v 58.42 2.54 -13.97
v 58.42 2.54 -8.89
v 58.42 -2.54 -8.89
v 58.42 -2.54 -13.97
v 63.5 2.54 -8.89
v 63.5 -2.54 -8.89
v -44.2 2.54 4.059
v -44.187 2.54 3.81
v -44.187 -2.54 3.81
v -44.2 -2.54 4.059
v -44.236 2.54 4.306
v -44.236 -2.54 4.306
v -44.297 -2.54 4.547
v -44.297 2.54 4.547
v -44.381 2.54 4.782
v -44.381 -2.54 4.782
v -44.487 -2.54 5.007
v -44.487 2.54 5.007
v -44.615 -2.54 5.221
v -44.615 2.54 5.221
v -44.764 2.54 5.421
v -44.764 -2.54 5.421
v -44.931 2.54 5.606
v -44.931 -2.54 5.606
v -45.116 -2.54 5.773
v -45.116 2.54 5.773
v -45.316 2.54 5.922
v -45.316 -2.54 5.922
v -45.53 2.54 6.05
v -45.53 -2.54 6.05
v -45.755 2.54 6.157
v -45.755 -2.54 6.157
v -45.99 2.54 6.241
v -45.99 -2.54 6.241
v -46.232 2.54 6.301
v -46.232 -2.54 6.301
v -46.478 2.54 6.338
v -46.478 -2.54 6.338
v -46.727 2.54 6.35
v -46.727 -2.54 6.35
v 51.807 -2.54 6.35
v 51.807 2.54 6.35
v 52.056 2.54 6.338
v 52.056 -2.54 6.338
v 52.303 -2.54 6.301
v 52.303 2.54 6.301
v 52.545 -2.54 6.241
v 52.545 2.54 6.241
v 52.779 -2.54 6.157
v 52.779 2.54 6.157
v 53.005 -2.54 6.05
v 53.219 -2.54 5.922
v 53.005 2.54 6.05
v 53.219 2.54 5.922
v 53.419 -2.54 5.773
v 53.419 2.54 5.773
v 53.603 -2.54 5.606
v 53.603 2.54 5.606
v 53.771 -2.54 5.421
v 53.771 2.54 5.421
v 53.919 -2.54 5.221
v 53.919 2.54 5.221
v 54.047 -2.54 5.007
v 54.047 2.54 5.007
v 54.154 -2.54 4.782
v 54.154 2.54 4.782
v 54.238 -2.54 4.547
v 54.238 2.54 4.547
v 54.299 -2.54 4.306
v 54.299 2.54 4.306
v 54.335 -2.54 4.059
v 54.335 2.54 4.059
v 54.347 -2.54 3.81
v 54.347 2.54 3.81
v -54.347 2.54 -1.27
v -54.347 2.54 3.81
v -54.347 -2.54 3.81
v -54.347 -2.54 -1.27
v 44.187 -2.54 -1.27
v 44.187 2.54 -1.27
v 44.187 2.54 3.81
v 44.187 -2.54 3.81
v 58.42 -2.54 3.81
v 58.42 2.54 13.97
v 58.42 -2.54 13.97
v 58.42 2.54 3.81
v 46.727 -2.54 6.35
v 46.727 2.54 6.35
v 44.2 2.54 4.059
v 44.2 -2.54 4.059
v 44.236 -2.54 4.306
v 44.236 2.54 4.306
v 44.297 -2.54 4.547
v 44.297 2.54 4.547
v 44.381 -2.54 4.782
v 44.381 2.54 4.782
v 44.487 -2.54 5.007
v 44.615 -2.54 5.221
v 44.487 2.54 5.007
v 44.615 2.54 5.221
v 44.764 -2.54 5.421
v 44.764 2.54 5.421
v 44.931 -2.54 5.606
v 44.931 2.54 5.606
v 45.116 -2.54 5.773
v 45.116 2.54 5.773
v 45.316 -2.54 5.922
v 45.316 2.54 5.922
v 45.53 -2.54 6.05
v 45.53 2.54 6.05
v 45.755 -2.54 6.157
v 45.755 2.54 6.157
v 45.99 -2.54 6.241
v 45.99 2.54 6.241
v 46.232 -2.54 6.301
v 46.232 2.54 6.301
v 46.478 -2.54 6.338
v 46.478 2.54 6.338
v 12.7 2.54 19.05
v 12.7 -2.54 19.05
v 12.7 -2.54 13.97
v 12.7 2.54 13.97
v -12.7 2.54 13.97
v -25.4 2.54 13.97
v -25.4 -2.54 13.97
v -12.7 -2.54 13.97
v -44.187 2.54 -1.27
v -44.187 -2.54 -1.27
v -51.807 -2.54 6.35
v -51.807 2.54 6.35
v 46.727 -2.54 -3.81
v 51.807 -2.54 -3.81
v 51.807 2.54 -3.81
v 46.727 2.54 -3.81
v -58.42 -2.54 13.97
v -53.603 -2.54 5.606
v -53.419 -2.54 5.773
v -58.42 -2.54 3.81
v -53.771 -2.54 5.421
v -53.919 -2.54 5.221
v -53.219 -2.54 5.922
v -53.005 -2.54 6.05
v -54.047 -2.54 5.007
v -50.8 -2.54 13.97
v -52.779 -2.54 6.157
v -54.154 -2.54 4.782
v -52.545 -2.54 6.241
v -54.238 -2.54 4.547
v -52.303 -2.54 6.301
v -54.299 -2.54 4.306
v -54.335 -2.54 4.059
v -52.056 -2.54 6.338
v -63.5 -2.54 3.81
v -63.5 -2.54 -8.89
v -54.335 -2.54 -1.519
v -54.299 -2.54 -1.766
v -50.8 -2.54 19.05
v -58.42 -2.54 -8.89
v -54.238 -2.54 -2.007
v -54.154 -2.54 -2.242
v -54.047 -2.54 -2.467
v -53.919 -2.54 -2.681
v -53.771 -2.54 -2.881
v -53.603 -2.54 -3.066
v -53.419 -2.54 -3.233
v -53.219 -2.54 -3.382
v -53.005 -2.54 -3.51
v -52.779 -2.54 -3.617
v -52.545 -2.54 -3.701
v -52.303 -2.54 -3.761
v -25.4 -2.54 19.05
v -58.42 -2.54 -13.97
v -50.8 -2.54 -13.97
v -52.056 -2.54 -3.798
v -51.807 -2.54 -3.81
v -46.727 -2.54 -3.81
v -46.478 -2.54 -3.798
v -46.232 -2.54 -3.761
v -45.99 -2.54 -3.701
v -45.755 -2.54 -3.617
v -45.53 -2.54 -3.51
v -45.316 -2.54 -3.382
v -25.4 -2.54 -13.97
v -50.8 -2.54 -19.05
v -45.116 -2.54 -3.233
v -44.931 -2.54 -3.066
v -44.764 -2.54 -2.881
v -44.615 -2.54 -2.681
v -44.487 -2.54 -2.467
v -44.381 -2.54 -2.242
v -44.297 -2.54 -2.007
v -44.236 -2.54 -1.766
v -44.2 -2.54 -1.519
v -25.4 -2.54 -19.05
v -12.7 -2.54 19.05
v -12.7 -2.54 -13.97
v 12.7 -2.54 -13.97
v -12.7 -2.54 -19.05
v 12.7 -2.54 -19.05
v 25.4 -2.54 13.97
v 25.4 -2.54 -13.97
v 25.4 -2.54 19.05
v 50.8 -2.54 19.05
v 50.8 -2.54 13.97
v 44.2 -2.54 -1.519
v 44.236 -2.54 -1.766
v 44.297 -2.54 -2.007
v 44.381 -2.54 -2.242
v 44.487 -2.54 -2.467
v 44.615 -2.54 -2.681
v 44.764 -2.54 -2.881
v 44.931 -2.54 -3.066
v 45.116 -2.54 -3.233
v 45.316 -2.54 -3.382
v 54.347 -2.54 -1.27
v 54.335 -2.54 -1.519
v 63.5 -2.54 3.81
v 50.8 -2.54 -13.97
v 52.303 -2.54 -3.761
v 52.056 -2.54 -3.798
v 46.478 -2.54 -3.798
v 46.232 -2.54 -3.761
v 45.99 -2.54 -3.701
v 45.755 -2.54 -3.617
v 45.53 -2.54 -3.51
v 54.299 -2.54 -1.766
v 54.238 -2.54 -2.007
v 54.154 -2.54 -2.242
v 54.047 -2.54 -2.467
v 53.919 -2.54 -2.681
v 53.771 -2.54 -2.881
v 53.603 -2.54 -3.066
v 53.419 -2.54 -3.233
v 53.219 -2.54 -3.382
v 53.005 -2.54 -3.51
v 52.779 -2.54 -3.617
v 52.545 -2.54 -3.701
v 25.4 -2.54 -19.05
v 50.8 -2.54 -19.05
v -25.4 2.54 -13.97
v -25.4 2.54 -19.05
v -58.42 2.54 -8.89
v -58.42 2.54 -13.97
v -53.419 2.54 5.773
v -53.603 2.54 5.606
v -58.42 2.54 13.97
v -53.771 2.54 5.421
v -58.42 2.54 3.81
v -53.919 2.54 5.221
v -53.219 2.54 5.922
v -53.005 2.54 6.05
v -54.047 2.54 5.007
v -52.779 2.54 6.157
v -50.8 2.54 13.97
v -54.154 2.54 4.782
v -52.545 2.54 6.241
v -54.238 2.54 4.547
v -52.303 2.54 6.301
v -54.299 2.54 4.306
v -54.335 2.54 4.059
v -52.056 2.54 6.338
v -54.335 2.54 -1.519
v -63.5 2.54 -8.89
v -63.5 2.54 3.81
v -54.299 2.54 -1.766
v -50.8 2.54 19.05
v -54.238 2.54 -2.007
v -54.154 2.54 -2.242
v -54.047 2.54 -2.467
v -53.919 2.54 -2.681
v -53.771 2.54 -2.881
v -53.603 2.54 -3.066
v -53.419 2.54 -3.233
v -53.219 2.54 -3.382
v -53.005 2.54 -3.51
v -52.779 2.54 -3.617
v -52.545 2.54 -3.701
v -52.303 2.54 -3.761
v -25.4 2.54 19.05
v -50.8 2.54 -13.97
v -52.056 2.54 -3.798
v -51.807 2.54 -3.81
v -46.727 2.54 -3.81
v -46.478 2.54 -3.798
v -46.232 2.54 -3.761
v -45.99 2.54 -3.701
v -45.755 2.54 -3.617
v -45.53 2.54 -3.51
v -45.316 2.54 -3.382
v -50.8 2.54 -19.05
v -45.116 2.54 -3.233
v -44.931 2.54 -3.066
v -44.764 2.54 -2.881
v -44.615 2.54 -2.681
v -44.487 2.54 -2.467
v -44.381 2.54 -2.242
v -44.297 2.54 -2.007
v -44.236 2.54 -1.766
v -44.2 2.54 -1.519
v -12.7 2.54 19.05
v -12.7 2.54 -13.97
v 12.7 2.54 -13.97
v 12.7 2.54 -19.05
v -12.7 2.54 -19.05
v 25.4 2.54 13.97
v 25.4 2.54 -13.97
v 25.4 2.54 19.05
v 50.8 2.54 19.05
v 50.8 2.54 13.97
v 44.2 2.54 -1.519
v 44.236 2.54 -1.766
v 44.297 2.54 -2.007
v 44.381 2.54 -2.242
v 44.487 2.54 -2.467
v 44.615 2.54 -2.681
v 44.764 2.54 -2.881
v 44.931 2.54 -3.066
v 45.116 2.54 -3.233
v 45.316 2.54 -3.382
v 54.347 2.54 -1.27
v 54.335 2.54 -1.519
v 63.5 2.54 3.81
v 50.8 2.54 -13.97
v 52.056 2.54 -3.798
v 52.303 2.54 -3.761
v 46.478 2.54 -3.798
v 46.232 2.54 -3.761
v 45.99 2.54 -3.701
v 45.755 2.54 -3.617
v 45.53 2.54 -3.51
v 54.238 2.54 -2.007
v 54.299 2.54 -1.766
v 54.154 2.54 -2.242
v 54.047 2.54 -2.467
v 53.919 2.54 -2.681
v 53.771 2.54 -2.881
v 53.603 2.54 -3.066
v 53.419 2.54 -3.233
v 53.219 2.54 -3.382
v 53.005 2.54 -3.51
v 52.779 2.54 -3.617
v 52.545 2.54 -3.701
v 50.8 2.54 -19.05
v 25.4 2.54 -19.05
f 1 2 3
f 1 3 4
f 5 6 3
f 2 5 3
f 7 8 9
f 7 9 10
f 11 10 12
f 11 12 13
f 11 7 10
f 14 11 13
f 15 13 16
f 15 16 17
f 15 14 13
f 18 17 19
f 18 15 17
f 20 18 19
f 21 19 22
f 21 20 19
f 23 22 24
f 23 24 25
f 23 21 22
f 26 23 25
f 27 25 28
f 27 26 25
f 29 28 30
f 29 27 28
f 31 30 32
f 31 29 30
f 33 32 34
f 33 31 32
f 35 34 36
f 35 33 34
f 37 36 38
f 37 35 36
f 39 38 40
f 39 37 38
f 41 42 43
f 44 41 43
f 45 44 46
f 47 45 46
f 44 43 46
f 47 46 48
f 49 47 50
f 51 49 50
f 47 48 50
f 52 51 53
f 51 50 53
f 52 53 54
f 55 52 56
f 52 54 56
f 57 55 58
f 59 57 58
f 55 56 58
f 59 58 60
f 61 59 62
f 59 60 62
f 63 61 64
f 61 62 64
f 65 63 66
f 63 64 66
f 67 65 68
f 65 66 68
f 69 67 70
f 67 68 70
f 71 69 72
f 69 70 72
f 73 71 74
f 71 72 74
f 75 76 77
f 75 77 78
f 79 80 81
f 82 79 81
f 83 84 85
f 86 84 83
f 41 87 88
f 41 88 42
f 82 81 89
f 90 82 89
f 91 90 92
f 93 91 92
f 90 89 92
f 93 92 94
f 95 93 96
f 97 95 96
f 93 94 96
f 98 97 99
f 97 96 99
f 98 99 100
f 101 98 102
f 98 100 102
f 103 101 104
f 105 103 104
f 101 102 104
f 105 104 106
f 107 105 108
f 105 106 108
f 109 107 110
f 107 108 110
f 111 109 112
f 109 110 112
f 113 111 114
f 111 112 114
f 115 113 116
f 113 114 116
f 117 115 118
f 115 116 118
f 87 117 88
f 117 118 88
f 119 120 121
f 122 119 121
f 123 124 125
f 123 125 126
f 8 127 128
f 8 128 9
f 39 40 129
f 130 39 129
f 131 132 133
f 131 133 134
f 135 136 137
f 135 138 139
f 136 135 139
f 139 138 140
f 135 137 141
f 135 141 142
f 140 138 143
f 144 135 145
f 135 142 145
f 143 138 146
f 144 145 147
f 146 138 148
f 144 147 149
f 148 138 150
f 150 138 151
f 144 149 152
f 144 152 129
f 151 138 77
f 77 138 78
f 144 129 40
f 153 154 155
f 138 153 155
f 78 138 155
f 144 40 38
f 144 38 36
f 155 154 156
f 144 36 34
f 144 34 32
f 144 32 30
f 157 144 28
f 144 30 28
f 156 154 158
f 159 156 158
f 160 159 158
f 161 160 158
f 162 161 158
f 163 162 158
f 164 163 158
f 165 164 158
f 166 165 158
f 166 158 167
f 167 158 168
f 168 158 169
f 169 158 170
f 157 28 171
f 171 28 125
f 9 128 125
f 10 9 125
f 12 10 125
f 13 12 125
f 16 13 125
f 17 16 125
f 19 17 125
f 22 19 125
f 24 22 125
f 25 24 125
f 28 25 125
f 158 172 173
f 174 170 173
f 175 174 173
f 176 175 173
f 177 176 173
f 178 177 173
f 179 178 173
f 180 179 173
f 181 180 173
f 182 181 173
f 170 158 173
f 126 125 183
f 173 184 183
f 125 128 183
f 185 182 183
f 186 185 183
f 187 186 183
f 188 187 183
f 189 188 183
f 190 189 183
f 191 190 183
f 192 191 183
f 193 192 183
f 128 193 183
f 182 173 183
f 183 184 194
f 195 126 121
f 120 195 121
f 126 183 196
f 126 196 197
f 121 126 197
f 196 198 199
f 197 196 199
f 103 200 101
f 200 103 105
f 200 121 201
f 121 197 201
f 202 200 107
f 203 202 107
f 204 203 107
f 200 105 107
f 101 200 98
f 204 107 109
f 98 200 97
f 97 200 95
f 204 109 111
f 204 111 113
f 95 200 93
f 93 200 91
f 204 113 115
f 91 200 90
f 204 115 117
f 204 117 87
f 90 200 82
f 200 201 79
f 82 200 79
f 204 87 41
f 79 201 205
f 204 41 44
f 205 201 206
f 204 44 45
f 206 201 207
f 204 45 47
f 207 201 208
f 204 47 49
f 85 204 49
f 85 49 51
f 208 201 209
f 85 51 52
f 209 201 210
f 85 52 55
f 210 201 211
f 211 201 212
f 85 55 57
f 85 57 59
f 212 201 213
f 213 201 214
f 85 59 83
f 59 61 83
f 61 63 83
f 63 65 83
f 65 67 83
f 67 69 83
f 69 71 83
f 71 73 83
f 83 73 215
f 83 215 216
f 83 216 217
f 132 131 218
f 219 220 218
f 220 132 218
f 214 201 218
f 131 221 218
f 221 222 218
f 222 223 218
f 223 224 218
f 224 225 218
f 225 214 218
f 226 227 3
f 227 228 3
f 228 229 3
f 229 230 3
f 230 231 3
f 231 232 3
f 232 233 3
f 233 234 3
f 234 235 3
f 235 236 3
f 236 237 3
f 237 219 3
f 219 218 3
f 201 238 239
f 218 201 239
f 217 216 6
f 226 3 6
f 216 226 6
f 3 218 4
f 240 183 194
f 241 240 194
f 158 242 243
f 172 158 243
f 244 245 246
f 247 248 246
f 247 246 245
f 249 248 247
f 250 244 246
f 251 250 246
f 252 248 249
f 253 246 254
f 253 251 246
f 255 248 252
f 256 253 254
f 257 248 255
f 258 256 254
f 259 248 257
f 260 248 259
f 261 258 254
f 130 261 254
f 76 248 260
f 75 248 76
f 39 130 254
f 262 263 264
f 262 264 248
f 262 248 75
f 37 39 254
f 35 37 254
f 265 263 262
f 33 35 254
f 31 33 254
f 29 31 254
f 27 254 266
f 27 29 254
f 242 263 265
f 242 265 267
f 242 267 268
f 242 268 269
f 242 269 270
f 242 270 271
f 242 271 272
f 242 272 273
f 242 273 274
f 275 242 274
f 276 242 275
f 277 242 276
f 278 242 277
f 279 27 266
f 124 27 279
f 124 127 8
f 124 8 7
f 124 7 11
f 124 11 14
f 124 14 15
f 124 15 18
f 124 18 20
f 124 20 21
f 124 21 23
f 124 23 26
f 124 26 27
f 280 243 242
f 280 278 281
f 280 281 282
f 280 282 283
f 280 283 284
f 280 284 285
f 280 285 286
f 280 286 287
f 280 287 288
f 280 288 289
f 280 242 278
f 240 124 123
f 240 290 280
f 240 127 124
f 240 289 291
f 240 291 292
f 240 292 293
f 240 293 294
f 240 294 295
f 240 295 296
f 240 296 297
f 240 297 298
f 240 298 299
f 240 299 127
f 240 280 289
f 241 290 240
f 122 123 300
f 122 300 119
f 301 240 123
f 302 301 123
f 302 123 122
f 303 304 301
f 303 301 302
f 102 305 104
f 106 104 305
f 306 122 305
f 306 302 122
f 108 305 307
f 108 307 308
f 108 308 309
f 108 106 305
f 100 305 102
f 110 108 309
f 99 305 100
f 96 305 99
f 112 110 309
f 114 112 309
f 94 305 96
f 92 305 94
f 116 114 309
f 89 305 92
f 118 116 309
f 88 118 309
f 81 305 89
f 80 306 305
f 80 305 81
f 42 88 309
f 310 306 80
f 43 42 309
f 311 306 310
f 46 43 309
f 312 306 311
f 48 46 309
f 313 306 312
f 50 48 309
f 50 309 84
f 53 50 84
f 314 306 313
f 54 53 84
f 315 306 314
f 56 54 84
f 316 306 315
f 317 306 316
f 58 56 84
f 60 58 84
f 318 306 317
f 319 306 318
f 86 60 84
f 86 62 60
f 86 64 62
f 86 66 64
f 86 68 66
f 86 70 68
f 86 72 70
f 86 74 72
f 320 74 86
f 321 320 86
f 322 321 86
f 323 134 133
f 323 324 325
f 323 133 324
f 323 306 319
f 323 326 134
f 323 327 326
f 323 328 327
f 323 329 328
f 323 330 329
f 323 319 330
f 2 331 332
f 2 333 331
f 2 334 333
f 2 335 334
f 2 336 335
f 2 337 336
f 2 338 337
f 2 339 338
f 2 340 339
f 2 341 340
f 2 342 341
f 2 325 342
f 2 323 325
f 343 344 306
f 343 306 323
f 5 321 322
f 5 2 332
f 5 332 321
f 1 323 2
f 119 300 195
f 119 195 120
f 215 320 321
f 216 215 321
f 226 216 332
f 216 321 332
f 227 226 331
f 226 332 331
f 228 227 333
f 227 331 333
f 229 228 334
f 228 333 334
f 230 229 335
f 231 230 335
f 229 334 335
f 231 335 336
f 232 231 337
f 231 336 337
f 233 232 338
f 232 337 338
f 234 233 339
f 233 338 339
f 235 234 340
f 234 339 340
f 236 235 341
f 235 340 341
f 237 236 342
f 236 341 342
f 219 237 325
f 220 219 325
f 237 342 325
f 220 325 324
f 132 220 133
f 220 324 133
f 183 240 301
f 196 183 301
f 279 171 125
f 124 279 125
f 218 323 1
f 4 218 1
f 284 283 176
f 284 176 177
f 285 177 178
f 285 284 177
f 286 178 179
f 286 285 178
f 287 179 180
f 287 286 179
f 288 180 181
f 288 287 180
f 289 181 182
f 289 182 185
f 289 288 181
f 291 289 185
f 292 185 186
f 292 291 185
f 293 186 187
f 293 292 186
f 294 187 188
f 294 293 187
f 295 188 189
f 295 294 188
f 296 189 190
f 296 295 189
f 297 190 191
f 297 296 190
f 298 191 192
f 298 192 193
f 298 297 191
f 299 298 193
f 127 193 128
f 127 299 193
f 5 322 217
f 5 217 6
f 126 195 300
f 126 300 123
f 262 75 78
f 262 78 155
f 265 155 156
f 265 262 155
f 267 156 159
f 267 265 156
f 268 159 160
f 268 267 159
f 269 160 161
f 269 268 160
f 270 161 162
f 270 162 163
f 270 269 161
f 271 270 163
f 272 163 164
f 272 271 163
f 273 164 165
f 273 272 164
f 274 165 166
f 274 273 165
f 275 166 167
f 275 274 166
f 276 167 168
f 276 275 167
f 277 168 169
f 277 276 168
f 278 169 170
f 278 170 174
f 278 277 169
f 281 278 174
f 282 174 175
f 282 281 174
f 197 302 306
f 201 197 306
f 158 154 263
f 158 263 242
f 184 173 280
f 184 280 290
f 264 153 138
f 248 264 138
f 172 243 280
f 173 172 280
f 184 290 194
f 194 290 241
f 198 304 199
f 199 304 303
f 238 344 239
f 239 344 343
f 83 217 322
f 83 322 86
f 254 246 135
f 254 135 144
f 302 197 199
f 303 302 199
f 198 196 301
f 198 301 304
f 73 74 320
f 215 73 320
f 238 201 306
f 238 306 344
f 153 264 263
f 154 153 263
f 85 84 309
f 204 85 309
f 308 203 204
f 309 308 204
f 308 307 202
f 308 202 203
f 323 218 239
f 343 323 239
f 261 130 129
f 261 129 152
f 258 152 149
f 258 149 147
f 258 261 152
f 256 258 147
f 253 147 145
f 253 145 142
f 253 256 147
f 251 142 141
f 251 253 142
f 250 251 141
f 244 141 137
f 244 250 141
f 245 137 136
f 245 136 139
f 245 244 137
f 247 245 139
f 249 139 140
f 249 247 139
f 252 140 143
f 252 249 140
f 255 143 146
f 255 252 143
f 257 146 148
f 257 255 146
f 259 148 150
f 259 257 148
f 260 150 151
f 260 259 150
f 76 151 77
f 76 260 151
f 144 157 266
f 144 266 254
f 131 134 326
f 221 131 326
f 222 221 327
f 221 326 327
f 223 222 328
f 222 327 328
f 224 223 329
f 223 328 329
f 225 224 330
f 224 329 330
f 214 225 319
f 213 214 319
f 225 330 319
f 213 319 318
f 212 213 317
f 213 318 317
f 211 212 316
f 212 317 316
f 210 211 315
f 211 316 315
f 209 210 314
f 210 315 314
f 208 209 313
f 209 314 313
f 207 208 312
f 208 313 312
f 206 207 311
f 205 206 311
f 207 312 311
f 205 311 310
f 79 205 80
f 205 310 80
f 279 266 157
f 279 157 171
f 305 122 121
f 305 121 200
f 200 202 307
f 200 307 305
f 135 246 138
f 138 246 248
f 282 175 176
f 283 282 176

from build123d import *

# Parameters (mm, degrees)
SKETCH1_W           = 127
SKETCH1_H           = 38.1
BOSS_EXTRUDE1_DEPTH = 2.54
SKETCH2_W           = 5.08
SKETCH2_H           = 10.16
SKETCH2_H_2         = 15.24
CUT_EXTRUDE1_DEPTH  = 5.08
SKETCH3_W           = 12.7
SKETCH3_H           = 5.08
CUT_EXTRUDE2_DEPTH  = 5.08
SKETCH4_W           = 12.7
SKETCH4_H           = 5.08
CUT_EXTRUDE4_DEPTH  = 5.08
LPATTERN1_COUNT     = 2
LPATTERN1_PITCH     = 38.1
SKETCH7_W           = 116.84
SKETCH7_H           = 5.08
CUT_EXTRUDE7_DEPTH  = 5.08
SKETCH8_W           = 25.4
SKETCH8_H           = 5.08
BOSS_EXTRUDE2_DEPTH = 5.08
CUT_EXTRUDE8_DEPTH  = 5.08


with BuildPart() as part:
    # Sketch1 → Boss-Extrude1 (new body, symmetric)
    with BuildSketch(Plane(origin=(0, 0, 0), x_dir=(1, 0, 0), z_dir=(0, 1, 0))):
        Rectangle(SKETCH1_W, SKETCH1_H)
    extrude(amount=BOSS_EXTRUDE1_DEPTH, both=True)

    # Sketch2 → Cut-Extrude1 (cut)
    with BuildSketch(Plane(origin=(0, 2.54, 0), x_dir=(1, 0, 0), z_dir=(0, 1, 0))):
        with Locations((-60.96, 13.97)):
            Rectangle(SKETCH2_W, SKETCH2_H)
        with Locations((-60.96, -11.43)):
            Rectangle(SKETCH2_W, SKETCH2_H_2)
    cut_extrude1 = extrude(amount=-CUT_EXTRUDE1_DEPTH, mode=Mode.SUBTRACT)

    # Mirror1: Cut-Extrude1 across plane
    add(cut_extrude1.mirror(Plane(origin=(0, 0, 0), x_dir=(0, 0, 1), z_dir=(1, 0, 0))), mode=Mode.SUBTRACT)

    # Sketch3 → Cut-Extrude2 (cut)
    with BuildSketch(Plane(origin=(0, 2.54, 0), x_dir=(1, 0, 0), z_dir=(0, 1, 0))):
        with Locations((-57.15, -16.51)):
            Rectangle(SKETCH3_W, SKETCH3_H)
    cut_extrude2 = extrude(amount=-CUT_EXTRUDE2_DEPTH, mode=Mode.SUBTRACT)

    # Mirror2: Cut-Extrude2 across plane
    add(cut_extrude2.mirror(Plane(origin=(0, 0, 0), x_dir=(0, 0, 1), z_dir=(1, 0, 0))), mode=Mode.SUBTRACT)

    # Sketch4 → Cut-Extrude4 (cut)
    with BuildSketch(Plane(origin=(0, 2.54, 0), x_dir=(1, 0, 0), z_dir=(0, 1, 0))):
        with Locations((-19.05, -16.51)):
            Rectangle(SKETCH4_W, SKETCH4_H)
    cut_extrude4 = extrude(amount=-CUT_EXTRUDE4_DEPTH, mode=Mode.SUBTRACT)

    # LPattern1: Cut-Extrude4 ×2
    with Locations(*[(i * LPATTERN1_PITCH, 0, 0) for i in range(1, LPATTERN1_COUNT)]):
        add(cut_extrude4, mode=Mode.SUBTRACT)

    # Sketch7 → Cut-Extrude7 (cut)
    with BuildSketch(Plane(origin=(0, 2.54, 0), x_dir=(1, 0, 0), z_dir=(0, 1, 0))):
        with Locations((0, 16.51)):
            Rectangle(SKETCH7_W, SKETCH7_H)
    extrude(amount=-CUT_EXTRUDE7_DEPTH, mode=Mode.SUBTRACT)

    # Sketch8 → Boss-Extrude2 (add)
    with BuildSketch(Plane(origin=(0, 2.54, 0), x_dir=(1, 0, 0), z_dir=(0, 1, 0))):
        with Locations((-38.1, 16.51)):
            Rectangle(SKETCH8_W, SKETCH8_H)
        with Locations((0, 16.51)):
            Rectangle(SKETCH8_W, SKETCH8_H)
        with Locations((38.1, 16.51)):
            Rectangle(SKETCH8_W, SKETCH8_H)
    extrude(amount=-BOSS_EXTRUDE2_DEPTH)

    # Sketch9 → Cut-Extrude8 (cut)
    with BuildSketch(Plane(origin=(0, 2.54, 0), x_dir=(1, 0, 0), z_dir=(0, 1, 0))):
        with BuildLine():
            Line((-51.807363259, 3.81), (-46.727363259, 3.81))
            ThreePointArc((-46.727363259, 3.81), (-44.931312035, 3.066051224), (-44.187363259, 1.27))
            Line((-44.187363259, 1.27), (-44.187363259, -3.81))
            ThreePointArc((-44.187363259, -3.81), (-44.931312035, -5.606051224), (-46.727363259, -6.35))
            Line((-46.727363259, -6.35), (-51.807363259, -6.35))
            ThreePointArc((-51.807363259, -6.35), (-53.603414483, -5.606051224), (-54.347363259, -3.81))
            Line((-54.347363259, -3.81), (-54.347363259, 1.27))
            ThreePointArc((-54.347363259, 1.27), (-53.603414483, 3.066051224), (-51.807363259, 3.81))
        make_face()
    cut_extrude8 = extrude(amount=-CUT_EXTRUDE8_DEPTH, mode=Mode.SUBTRACT)

    # Mirror3: Cut-Extrude8 across plane
    add(cut_extrude8.mirror(Plane(origin=(0, 0, 0), x_dir=(0, 0, 1), z_dir=(1, 0, 0))), mode=Mode.SUBTRACT)


solid = part.part
